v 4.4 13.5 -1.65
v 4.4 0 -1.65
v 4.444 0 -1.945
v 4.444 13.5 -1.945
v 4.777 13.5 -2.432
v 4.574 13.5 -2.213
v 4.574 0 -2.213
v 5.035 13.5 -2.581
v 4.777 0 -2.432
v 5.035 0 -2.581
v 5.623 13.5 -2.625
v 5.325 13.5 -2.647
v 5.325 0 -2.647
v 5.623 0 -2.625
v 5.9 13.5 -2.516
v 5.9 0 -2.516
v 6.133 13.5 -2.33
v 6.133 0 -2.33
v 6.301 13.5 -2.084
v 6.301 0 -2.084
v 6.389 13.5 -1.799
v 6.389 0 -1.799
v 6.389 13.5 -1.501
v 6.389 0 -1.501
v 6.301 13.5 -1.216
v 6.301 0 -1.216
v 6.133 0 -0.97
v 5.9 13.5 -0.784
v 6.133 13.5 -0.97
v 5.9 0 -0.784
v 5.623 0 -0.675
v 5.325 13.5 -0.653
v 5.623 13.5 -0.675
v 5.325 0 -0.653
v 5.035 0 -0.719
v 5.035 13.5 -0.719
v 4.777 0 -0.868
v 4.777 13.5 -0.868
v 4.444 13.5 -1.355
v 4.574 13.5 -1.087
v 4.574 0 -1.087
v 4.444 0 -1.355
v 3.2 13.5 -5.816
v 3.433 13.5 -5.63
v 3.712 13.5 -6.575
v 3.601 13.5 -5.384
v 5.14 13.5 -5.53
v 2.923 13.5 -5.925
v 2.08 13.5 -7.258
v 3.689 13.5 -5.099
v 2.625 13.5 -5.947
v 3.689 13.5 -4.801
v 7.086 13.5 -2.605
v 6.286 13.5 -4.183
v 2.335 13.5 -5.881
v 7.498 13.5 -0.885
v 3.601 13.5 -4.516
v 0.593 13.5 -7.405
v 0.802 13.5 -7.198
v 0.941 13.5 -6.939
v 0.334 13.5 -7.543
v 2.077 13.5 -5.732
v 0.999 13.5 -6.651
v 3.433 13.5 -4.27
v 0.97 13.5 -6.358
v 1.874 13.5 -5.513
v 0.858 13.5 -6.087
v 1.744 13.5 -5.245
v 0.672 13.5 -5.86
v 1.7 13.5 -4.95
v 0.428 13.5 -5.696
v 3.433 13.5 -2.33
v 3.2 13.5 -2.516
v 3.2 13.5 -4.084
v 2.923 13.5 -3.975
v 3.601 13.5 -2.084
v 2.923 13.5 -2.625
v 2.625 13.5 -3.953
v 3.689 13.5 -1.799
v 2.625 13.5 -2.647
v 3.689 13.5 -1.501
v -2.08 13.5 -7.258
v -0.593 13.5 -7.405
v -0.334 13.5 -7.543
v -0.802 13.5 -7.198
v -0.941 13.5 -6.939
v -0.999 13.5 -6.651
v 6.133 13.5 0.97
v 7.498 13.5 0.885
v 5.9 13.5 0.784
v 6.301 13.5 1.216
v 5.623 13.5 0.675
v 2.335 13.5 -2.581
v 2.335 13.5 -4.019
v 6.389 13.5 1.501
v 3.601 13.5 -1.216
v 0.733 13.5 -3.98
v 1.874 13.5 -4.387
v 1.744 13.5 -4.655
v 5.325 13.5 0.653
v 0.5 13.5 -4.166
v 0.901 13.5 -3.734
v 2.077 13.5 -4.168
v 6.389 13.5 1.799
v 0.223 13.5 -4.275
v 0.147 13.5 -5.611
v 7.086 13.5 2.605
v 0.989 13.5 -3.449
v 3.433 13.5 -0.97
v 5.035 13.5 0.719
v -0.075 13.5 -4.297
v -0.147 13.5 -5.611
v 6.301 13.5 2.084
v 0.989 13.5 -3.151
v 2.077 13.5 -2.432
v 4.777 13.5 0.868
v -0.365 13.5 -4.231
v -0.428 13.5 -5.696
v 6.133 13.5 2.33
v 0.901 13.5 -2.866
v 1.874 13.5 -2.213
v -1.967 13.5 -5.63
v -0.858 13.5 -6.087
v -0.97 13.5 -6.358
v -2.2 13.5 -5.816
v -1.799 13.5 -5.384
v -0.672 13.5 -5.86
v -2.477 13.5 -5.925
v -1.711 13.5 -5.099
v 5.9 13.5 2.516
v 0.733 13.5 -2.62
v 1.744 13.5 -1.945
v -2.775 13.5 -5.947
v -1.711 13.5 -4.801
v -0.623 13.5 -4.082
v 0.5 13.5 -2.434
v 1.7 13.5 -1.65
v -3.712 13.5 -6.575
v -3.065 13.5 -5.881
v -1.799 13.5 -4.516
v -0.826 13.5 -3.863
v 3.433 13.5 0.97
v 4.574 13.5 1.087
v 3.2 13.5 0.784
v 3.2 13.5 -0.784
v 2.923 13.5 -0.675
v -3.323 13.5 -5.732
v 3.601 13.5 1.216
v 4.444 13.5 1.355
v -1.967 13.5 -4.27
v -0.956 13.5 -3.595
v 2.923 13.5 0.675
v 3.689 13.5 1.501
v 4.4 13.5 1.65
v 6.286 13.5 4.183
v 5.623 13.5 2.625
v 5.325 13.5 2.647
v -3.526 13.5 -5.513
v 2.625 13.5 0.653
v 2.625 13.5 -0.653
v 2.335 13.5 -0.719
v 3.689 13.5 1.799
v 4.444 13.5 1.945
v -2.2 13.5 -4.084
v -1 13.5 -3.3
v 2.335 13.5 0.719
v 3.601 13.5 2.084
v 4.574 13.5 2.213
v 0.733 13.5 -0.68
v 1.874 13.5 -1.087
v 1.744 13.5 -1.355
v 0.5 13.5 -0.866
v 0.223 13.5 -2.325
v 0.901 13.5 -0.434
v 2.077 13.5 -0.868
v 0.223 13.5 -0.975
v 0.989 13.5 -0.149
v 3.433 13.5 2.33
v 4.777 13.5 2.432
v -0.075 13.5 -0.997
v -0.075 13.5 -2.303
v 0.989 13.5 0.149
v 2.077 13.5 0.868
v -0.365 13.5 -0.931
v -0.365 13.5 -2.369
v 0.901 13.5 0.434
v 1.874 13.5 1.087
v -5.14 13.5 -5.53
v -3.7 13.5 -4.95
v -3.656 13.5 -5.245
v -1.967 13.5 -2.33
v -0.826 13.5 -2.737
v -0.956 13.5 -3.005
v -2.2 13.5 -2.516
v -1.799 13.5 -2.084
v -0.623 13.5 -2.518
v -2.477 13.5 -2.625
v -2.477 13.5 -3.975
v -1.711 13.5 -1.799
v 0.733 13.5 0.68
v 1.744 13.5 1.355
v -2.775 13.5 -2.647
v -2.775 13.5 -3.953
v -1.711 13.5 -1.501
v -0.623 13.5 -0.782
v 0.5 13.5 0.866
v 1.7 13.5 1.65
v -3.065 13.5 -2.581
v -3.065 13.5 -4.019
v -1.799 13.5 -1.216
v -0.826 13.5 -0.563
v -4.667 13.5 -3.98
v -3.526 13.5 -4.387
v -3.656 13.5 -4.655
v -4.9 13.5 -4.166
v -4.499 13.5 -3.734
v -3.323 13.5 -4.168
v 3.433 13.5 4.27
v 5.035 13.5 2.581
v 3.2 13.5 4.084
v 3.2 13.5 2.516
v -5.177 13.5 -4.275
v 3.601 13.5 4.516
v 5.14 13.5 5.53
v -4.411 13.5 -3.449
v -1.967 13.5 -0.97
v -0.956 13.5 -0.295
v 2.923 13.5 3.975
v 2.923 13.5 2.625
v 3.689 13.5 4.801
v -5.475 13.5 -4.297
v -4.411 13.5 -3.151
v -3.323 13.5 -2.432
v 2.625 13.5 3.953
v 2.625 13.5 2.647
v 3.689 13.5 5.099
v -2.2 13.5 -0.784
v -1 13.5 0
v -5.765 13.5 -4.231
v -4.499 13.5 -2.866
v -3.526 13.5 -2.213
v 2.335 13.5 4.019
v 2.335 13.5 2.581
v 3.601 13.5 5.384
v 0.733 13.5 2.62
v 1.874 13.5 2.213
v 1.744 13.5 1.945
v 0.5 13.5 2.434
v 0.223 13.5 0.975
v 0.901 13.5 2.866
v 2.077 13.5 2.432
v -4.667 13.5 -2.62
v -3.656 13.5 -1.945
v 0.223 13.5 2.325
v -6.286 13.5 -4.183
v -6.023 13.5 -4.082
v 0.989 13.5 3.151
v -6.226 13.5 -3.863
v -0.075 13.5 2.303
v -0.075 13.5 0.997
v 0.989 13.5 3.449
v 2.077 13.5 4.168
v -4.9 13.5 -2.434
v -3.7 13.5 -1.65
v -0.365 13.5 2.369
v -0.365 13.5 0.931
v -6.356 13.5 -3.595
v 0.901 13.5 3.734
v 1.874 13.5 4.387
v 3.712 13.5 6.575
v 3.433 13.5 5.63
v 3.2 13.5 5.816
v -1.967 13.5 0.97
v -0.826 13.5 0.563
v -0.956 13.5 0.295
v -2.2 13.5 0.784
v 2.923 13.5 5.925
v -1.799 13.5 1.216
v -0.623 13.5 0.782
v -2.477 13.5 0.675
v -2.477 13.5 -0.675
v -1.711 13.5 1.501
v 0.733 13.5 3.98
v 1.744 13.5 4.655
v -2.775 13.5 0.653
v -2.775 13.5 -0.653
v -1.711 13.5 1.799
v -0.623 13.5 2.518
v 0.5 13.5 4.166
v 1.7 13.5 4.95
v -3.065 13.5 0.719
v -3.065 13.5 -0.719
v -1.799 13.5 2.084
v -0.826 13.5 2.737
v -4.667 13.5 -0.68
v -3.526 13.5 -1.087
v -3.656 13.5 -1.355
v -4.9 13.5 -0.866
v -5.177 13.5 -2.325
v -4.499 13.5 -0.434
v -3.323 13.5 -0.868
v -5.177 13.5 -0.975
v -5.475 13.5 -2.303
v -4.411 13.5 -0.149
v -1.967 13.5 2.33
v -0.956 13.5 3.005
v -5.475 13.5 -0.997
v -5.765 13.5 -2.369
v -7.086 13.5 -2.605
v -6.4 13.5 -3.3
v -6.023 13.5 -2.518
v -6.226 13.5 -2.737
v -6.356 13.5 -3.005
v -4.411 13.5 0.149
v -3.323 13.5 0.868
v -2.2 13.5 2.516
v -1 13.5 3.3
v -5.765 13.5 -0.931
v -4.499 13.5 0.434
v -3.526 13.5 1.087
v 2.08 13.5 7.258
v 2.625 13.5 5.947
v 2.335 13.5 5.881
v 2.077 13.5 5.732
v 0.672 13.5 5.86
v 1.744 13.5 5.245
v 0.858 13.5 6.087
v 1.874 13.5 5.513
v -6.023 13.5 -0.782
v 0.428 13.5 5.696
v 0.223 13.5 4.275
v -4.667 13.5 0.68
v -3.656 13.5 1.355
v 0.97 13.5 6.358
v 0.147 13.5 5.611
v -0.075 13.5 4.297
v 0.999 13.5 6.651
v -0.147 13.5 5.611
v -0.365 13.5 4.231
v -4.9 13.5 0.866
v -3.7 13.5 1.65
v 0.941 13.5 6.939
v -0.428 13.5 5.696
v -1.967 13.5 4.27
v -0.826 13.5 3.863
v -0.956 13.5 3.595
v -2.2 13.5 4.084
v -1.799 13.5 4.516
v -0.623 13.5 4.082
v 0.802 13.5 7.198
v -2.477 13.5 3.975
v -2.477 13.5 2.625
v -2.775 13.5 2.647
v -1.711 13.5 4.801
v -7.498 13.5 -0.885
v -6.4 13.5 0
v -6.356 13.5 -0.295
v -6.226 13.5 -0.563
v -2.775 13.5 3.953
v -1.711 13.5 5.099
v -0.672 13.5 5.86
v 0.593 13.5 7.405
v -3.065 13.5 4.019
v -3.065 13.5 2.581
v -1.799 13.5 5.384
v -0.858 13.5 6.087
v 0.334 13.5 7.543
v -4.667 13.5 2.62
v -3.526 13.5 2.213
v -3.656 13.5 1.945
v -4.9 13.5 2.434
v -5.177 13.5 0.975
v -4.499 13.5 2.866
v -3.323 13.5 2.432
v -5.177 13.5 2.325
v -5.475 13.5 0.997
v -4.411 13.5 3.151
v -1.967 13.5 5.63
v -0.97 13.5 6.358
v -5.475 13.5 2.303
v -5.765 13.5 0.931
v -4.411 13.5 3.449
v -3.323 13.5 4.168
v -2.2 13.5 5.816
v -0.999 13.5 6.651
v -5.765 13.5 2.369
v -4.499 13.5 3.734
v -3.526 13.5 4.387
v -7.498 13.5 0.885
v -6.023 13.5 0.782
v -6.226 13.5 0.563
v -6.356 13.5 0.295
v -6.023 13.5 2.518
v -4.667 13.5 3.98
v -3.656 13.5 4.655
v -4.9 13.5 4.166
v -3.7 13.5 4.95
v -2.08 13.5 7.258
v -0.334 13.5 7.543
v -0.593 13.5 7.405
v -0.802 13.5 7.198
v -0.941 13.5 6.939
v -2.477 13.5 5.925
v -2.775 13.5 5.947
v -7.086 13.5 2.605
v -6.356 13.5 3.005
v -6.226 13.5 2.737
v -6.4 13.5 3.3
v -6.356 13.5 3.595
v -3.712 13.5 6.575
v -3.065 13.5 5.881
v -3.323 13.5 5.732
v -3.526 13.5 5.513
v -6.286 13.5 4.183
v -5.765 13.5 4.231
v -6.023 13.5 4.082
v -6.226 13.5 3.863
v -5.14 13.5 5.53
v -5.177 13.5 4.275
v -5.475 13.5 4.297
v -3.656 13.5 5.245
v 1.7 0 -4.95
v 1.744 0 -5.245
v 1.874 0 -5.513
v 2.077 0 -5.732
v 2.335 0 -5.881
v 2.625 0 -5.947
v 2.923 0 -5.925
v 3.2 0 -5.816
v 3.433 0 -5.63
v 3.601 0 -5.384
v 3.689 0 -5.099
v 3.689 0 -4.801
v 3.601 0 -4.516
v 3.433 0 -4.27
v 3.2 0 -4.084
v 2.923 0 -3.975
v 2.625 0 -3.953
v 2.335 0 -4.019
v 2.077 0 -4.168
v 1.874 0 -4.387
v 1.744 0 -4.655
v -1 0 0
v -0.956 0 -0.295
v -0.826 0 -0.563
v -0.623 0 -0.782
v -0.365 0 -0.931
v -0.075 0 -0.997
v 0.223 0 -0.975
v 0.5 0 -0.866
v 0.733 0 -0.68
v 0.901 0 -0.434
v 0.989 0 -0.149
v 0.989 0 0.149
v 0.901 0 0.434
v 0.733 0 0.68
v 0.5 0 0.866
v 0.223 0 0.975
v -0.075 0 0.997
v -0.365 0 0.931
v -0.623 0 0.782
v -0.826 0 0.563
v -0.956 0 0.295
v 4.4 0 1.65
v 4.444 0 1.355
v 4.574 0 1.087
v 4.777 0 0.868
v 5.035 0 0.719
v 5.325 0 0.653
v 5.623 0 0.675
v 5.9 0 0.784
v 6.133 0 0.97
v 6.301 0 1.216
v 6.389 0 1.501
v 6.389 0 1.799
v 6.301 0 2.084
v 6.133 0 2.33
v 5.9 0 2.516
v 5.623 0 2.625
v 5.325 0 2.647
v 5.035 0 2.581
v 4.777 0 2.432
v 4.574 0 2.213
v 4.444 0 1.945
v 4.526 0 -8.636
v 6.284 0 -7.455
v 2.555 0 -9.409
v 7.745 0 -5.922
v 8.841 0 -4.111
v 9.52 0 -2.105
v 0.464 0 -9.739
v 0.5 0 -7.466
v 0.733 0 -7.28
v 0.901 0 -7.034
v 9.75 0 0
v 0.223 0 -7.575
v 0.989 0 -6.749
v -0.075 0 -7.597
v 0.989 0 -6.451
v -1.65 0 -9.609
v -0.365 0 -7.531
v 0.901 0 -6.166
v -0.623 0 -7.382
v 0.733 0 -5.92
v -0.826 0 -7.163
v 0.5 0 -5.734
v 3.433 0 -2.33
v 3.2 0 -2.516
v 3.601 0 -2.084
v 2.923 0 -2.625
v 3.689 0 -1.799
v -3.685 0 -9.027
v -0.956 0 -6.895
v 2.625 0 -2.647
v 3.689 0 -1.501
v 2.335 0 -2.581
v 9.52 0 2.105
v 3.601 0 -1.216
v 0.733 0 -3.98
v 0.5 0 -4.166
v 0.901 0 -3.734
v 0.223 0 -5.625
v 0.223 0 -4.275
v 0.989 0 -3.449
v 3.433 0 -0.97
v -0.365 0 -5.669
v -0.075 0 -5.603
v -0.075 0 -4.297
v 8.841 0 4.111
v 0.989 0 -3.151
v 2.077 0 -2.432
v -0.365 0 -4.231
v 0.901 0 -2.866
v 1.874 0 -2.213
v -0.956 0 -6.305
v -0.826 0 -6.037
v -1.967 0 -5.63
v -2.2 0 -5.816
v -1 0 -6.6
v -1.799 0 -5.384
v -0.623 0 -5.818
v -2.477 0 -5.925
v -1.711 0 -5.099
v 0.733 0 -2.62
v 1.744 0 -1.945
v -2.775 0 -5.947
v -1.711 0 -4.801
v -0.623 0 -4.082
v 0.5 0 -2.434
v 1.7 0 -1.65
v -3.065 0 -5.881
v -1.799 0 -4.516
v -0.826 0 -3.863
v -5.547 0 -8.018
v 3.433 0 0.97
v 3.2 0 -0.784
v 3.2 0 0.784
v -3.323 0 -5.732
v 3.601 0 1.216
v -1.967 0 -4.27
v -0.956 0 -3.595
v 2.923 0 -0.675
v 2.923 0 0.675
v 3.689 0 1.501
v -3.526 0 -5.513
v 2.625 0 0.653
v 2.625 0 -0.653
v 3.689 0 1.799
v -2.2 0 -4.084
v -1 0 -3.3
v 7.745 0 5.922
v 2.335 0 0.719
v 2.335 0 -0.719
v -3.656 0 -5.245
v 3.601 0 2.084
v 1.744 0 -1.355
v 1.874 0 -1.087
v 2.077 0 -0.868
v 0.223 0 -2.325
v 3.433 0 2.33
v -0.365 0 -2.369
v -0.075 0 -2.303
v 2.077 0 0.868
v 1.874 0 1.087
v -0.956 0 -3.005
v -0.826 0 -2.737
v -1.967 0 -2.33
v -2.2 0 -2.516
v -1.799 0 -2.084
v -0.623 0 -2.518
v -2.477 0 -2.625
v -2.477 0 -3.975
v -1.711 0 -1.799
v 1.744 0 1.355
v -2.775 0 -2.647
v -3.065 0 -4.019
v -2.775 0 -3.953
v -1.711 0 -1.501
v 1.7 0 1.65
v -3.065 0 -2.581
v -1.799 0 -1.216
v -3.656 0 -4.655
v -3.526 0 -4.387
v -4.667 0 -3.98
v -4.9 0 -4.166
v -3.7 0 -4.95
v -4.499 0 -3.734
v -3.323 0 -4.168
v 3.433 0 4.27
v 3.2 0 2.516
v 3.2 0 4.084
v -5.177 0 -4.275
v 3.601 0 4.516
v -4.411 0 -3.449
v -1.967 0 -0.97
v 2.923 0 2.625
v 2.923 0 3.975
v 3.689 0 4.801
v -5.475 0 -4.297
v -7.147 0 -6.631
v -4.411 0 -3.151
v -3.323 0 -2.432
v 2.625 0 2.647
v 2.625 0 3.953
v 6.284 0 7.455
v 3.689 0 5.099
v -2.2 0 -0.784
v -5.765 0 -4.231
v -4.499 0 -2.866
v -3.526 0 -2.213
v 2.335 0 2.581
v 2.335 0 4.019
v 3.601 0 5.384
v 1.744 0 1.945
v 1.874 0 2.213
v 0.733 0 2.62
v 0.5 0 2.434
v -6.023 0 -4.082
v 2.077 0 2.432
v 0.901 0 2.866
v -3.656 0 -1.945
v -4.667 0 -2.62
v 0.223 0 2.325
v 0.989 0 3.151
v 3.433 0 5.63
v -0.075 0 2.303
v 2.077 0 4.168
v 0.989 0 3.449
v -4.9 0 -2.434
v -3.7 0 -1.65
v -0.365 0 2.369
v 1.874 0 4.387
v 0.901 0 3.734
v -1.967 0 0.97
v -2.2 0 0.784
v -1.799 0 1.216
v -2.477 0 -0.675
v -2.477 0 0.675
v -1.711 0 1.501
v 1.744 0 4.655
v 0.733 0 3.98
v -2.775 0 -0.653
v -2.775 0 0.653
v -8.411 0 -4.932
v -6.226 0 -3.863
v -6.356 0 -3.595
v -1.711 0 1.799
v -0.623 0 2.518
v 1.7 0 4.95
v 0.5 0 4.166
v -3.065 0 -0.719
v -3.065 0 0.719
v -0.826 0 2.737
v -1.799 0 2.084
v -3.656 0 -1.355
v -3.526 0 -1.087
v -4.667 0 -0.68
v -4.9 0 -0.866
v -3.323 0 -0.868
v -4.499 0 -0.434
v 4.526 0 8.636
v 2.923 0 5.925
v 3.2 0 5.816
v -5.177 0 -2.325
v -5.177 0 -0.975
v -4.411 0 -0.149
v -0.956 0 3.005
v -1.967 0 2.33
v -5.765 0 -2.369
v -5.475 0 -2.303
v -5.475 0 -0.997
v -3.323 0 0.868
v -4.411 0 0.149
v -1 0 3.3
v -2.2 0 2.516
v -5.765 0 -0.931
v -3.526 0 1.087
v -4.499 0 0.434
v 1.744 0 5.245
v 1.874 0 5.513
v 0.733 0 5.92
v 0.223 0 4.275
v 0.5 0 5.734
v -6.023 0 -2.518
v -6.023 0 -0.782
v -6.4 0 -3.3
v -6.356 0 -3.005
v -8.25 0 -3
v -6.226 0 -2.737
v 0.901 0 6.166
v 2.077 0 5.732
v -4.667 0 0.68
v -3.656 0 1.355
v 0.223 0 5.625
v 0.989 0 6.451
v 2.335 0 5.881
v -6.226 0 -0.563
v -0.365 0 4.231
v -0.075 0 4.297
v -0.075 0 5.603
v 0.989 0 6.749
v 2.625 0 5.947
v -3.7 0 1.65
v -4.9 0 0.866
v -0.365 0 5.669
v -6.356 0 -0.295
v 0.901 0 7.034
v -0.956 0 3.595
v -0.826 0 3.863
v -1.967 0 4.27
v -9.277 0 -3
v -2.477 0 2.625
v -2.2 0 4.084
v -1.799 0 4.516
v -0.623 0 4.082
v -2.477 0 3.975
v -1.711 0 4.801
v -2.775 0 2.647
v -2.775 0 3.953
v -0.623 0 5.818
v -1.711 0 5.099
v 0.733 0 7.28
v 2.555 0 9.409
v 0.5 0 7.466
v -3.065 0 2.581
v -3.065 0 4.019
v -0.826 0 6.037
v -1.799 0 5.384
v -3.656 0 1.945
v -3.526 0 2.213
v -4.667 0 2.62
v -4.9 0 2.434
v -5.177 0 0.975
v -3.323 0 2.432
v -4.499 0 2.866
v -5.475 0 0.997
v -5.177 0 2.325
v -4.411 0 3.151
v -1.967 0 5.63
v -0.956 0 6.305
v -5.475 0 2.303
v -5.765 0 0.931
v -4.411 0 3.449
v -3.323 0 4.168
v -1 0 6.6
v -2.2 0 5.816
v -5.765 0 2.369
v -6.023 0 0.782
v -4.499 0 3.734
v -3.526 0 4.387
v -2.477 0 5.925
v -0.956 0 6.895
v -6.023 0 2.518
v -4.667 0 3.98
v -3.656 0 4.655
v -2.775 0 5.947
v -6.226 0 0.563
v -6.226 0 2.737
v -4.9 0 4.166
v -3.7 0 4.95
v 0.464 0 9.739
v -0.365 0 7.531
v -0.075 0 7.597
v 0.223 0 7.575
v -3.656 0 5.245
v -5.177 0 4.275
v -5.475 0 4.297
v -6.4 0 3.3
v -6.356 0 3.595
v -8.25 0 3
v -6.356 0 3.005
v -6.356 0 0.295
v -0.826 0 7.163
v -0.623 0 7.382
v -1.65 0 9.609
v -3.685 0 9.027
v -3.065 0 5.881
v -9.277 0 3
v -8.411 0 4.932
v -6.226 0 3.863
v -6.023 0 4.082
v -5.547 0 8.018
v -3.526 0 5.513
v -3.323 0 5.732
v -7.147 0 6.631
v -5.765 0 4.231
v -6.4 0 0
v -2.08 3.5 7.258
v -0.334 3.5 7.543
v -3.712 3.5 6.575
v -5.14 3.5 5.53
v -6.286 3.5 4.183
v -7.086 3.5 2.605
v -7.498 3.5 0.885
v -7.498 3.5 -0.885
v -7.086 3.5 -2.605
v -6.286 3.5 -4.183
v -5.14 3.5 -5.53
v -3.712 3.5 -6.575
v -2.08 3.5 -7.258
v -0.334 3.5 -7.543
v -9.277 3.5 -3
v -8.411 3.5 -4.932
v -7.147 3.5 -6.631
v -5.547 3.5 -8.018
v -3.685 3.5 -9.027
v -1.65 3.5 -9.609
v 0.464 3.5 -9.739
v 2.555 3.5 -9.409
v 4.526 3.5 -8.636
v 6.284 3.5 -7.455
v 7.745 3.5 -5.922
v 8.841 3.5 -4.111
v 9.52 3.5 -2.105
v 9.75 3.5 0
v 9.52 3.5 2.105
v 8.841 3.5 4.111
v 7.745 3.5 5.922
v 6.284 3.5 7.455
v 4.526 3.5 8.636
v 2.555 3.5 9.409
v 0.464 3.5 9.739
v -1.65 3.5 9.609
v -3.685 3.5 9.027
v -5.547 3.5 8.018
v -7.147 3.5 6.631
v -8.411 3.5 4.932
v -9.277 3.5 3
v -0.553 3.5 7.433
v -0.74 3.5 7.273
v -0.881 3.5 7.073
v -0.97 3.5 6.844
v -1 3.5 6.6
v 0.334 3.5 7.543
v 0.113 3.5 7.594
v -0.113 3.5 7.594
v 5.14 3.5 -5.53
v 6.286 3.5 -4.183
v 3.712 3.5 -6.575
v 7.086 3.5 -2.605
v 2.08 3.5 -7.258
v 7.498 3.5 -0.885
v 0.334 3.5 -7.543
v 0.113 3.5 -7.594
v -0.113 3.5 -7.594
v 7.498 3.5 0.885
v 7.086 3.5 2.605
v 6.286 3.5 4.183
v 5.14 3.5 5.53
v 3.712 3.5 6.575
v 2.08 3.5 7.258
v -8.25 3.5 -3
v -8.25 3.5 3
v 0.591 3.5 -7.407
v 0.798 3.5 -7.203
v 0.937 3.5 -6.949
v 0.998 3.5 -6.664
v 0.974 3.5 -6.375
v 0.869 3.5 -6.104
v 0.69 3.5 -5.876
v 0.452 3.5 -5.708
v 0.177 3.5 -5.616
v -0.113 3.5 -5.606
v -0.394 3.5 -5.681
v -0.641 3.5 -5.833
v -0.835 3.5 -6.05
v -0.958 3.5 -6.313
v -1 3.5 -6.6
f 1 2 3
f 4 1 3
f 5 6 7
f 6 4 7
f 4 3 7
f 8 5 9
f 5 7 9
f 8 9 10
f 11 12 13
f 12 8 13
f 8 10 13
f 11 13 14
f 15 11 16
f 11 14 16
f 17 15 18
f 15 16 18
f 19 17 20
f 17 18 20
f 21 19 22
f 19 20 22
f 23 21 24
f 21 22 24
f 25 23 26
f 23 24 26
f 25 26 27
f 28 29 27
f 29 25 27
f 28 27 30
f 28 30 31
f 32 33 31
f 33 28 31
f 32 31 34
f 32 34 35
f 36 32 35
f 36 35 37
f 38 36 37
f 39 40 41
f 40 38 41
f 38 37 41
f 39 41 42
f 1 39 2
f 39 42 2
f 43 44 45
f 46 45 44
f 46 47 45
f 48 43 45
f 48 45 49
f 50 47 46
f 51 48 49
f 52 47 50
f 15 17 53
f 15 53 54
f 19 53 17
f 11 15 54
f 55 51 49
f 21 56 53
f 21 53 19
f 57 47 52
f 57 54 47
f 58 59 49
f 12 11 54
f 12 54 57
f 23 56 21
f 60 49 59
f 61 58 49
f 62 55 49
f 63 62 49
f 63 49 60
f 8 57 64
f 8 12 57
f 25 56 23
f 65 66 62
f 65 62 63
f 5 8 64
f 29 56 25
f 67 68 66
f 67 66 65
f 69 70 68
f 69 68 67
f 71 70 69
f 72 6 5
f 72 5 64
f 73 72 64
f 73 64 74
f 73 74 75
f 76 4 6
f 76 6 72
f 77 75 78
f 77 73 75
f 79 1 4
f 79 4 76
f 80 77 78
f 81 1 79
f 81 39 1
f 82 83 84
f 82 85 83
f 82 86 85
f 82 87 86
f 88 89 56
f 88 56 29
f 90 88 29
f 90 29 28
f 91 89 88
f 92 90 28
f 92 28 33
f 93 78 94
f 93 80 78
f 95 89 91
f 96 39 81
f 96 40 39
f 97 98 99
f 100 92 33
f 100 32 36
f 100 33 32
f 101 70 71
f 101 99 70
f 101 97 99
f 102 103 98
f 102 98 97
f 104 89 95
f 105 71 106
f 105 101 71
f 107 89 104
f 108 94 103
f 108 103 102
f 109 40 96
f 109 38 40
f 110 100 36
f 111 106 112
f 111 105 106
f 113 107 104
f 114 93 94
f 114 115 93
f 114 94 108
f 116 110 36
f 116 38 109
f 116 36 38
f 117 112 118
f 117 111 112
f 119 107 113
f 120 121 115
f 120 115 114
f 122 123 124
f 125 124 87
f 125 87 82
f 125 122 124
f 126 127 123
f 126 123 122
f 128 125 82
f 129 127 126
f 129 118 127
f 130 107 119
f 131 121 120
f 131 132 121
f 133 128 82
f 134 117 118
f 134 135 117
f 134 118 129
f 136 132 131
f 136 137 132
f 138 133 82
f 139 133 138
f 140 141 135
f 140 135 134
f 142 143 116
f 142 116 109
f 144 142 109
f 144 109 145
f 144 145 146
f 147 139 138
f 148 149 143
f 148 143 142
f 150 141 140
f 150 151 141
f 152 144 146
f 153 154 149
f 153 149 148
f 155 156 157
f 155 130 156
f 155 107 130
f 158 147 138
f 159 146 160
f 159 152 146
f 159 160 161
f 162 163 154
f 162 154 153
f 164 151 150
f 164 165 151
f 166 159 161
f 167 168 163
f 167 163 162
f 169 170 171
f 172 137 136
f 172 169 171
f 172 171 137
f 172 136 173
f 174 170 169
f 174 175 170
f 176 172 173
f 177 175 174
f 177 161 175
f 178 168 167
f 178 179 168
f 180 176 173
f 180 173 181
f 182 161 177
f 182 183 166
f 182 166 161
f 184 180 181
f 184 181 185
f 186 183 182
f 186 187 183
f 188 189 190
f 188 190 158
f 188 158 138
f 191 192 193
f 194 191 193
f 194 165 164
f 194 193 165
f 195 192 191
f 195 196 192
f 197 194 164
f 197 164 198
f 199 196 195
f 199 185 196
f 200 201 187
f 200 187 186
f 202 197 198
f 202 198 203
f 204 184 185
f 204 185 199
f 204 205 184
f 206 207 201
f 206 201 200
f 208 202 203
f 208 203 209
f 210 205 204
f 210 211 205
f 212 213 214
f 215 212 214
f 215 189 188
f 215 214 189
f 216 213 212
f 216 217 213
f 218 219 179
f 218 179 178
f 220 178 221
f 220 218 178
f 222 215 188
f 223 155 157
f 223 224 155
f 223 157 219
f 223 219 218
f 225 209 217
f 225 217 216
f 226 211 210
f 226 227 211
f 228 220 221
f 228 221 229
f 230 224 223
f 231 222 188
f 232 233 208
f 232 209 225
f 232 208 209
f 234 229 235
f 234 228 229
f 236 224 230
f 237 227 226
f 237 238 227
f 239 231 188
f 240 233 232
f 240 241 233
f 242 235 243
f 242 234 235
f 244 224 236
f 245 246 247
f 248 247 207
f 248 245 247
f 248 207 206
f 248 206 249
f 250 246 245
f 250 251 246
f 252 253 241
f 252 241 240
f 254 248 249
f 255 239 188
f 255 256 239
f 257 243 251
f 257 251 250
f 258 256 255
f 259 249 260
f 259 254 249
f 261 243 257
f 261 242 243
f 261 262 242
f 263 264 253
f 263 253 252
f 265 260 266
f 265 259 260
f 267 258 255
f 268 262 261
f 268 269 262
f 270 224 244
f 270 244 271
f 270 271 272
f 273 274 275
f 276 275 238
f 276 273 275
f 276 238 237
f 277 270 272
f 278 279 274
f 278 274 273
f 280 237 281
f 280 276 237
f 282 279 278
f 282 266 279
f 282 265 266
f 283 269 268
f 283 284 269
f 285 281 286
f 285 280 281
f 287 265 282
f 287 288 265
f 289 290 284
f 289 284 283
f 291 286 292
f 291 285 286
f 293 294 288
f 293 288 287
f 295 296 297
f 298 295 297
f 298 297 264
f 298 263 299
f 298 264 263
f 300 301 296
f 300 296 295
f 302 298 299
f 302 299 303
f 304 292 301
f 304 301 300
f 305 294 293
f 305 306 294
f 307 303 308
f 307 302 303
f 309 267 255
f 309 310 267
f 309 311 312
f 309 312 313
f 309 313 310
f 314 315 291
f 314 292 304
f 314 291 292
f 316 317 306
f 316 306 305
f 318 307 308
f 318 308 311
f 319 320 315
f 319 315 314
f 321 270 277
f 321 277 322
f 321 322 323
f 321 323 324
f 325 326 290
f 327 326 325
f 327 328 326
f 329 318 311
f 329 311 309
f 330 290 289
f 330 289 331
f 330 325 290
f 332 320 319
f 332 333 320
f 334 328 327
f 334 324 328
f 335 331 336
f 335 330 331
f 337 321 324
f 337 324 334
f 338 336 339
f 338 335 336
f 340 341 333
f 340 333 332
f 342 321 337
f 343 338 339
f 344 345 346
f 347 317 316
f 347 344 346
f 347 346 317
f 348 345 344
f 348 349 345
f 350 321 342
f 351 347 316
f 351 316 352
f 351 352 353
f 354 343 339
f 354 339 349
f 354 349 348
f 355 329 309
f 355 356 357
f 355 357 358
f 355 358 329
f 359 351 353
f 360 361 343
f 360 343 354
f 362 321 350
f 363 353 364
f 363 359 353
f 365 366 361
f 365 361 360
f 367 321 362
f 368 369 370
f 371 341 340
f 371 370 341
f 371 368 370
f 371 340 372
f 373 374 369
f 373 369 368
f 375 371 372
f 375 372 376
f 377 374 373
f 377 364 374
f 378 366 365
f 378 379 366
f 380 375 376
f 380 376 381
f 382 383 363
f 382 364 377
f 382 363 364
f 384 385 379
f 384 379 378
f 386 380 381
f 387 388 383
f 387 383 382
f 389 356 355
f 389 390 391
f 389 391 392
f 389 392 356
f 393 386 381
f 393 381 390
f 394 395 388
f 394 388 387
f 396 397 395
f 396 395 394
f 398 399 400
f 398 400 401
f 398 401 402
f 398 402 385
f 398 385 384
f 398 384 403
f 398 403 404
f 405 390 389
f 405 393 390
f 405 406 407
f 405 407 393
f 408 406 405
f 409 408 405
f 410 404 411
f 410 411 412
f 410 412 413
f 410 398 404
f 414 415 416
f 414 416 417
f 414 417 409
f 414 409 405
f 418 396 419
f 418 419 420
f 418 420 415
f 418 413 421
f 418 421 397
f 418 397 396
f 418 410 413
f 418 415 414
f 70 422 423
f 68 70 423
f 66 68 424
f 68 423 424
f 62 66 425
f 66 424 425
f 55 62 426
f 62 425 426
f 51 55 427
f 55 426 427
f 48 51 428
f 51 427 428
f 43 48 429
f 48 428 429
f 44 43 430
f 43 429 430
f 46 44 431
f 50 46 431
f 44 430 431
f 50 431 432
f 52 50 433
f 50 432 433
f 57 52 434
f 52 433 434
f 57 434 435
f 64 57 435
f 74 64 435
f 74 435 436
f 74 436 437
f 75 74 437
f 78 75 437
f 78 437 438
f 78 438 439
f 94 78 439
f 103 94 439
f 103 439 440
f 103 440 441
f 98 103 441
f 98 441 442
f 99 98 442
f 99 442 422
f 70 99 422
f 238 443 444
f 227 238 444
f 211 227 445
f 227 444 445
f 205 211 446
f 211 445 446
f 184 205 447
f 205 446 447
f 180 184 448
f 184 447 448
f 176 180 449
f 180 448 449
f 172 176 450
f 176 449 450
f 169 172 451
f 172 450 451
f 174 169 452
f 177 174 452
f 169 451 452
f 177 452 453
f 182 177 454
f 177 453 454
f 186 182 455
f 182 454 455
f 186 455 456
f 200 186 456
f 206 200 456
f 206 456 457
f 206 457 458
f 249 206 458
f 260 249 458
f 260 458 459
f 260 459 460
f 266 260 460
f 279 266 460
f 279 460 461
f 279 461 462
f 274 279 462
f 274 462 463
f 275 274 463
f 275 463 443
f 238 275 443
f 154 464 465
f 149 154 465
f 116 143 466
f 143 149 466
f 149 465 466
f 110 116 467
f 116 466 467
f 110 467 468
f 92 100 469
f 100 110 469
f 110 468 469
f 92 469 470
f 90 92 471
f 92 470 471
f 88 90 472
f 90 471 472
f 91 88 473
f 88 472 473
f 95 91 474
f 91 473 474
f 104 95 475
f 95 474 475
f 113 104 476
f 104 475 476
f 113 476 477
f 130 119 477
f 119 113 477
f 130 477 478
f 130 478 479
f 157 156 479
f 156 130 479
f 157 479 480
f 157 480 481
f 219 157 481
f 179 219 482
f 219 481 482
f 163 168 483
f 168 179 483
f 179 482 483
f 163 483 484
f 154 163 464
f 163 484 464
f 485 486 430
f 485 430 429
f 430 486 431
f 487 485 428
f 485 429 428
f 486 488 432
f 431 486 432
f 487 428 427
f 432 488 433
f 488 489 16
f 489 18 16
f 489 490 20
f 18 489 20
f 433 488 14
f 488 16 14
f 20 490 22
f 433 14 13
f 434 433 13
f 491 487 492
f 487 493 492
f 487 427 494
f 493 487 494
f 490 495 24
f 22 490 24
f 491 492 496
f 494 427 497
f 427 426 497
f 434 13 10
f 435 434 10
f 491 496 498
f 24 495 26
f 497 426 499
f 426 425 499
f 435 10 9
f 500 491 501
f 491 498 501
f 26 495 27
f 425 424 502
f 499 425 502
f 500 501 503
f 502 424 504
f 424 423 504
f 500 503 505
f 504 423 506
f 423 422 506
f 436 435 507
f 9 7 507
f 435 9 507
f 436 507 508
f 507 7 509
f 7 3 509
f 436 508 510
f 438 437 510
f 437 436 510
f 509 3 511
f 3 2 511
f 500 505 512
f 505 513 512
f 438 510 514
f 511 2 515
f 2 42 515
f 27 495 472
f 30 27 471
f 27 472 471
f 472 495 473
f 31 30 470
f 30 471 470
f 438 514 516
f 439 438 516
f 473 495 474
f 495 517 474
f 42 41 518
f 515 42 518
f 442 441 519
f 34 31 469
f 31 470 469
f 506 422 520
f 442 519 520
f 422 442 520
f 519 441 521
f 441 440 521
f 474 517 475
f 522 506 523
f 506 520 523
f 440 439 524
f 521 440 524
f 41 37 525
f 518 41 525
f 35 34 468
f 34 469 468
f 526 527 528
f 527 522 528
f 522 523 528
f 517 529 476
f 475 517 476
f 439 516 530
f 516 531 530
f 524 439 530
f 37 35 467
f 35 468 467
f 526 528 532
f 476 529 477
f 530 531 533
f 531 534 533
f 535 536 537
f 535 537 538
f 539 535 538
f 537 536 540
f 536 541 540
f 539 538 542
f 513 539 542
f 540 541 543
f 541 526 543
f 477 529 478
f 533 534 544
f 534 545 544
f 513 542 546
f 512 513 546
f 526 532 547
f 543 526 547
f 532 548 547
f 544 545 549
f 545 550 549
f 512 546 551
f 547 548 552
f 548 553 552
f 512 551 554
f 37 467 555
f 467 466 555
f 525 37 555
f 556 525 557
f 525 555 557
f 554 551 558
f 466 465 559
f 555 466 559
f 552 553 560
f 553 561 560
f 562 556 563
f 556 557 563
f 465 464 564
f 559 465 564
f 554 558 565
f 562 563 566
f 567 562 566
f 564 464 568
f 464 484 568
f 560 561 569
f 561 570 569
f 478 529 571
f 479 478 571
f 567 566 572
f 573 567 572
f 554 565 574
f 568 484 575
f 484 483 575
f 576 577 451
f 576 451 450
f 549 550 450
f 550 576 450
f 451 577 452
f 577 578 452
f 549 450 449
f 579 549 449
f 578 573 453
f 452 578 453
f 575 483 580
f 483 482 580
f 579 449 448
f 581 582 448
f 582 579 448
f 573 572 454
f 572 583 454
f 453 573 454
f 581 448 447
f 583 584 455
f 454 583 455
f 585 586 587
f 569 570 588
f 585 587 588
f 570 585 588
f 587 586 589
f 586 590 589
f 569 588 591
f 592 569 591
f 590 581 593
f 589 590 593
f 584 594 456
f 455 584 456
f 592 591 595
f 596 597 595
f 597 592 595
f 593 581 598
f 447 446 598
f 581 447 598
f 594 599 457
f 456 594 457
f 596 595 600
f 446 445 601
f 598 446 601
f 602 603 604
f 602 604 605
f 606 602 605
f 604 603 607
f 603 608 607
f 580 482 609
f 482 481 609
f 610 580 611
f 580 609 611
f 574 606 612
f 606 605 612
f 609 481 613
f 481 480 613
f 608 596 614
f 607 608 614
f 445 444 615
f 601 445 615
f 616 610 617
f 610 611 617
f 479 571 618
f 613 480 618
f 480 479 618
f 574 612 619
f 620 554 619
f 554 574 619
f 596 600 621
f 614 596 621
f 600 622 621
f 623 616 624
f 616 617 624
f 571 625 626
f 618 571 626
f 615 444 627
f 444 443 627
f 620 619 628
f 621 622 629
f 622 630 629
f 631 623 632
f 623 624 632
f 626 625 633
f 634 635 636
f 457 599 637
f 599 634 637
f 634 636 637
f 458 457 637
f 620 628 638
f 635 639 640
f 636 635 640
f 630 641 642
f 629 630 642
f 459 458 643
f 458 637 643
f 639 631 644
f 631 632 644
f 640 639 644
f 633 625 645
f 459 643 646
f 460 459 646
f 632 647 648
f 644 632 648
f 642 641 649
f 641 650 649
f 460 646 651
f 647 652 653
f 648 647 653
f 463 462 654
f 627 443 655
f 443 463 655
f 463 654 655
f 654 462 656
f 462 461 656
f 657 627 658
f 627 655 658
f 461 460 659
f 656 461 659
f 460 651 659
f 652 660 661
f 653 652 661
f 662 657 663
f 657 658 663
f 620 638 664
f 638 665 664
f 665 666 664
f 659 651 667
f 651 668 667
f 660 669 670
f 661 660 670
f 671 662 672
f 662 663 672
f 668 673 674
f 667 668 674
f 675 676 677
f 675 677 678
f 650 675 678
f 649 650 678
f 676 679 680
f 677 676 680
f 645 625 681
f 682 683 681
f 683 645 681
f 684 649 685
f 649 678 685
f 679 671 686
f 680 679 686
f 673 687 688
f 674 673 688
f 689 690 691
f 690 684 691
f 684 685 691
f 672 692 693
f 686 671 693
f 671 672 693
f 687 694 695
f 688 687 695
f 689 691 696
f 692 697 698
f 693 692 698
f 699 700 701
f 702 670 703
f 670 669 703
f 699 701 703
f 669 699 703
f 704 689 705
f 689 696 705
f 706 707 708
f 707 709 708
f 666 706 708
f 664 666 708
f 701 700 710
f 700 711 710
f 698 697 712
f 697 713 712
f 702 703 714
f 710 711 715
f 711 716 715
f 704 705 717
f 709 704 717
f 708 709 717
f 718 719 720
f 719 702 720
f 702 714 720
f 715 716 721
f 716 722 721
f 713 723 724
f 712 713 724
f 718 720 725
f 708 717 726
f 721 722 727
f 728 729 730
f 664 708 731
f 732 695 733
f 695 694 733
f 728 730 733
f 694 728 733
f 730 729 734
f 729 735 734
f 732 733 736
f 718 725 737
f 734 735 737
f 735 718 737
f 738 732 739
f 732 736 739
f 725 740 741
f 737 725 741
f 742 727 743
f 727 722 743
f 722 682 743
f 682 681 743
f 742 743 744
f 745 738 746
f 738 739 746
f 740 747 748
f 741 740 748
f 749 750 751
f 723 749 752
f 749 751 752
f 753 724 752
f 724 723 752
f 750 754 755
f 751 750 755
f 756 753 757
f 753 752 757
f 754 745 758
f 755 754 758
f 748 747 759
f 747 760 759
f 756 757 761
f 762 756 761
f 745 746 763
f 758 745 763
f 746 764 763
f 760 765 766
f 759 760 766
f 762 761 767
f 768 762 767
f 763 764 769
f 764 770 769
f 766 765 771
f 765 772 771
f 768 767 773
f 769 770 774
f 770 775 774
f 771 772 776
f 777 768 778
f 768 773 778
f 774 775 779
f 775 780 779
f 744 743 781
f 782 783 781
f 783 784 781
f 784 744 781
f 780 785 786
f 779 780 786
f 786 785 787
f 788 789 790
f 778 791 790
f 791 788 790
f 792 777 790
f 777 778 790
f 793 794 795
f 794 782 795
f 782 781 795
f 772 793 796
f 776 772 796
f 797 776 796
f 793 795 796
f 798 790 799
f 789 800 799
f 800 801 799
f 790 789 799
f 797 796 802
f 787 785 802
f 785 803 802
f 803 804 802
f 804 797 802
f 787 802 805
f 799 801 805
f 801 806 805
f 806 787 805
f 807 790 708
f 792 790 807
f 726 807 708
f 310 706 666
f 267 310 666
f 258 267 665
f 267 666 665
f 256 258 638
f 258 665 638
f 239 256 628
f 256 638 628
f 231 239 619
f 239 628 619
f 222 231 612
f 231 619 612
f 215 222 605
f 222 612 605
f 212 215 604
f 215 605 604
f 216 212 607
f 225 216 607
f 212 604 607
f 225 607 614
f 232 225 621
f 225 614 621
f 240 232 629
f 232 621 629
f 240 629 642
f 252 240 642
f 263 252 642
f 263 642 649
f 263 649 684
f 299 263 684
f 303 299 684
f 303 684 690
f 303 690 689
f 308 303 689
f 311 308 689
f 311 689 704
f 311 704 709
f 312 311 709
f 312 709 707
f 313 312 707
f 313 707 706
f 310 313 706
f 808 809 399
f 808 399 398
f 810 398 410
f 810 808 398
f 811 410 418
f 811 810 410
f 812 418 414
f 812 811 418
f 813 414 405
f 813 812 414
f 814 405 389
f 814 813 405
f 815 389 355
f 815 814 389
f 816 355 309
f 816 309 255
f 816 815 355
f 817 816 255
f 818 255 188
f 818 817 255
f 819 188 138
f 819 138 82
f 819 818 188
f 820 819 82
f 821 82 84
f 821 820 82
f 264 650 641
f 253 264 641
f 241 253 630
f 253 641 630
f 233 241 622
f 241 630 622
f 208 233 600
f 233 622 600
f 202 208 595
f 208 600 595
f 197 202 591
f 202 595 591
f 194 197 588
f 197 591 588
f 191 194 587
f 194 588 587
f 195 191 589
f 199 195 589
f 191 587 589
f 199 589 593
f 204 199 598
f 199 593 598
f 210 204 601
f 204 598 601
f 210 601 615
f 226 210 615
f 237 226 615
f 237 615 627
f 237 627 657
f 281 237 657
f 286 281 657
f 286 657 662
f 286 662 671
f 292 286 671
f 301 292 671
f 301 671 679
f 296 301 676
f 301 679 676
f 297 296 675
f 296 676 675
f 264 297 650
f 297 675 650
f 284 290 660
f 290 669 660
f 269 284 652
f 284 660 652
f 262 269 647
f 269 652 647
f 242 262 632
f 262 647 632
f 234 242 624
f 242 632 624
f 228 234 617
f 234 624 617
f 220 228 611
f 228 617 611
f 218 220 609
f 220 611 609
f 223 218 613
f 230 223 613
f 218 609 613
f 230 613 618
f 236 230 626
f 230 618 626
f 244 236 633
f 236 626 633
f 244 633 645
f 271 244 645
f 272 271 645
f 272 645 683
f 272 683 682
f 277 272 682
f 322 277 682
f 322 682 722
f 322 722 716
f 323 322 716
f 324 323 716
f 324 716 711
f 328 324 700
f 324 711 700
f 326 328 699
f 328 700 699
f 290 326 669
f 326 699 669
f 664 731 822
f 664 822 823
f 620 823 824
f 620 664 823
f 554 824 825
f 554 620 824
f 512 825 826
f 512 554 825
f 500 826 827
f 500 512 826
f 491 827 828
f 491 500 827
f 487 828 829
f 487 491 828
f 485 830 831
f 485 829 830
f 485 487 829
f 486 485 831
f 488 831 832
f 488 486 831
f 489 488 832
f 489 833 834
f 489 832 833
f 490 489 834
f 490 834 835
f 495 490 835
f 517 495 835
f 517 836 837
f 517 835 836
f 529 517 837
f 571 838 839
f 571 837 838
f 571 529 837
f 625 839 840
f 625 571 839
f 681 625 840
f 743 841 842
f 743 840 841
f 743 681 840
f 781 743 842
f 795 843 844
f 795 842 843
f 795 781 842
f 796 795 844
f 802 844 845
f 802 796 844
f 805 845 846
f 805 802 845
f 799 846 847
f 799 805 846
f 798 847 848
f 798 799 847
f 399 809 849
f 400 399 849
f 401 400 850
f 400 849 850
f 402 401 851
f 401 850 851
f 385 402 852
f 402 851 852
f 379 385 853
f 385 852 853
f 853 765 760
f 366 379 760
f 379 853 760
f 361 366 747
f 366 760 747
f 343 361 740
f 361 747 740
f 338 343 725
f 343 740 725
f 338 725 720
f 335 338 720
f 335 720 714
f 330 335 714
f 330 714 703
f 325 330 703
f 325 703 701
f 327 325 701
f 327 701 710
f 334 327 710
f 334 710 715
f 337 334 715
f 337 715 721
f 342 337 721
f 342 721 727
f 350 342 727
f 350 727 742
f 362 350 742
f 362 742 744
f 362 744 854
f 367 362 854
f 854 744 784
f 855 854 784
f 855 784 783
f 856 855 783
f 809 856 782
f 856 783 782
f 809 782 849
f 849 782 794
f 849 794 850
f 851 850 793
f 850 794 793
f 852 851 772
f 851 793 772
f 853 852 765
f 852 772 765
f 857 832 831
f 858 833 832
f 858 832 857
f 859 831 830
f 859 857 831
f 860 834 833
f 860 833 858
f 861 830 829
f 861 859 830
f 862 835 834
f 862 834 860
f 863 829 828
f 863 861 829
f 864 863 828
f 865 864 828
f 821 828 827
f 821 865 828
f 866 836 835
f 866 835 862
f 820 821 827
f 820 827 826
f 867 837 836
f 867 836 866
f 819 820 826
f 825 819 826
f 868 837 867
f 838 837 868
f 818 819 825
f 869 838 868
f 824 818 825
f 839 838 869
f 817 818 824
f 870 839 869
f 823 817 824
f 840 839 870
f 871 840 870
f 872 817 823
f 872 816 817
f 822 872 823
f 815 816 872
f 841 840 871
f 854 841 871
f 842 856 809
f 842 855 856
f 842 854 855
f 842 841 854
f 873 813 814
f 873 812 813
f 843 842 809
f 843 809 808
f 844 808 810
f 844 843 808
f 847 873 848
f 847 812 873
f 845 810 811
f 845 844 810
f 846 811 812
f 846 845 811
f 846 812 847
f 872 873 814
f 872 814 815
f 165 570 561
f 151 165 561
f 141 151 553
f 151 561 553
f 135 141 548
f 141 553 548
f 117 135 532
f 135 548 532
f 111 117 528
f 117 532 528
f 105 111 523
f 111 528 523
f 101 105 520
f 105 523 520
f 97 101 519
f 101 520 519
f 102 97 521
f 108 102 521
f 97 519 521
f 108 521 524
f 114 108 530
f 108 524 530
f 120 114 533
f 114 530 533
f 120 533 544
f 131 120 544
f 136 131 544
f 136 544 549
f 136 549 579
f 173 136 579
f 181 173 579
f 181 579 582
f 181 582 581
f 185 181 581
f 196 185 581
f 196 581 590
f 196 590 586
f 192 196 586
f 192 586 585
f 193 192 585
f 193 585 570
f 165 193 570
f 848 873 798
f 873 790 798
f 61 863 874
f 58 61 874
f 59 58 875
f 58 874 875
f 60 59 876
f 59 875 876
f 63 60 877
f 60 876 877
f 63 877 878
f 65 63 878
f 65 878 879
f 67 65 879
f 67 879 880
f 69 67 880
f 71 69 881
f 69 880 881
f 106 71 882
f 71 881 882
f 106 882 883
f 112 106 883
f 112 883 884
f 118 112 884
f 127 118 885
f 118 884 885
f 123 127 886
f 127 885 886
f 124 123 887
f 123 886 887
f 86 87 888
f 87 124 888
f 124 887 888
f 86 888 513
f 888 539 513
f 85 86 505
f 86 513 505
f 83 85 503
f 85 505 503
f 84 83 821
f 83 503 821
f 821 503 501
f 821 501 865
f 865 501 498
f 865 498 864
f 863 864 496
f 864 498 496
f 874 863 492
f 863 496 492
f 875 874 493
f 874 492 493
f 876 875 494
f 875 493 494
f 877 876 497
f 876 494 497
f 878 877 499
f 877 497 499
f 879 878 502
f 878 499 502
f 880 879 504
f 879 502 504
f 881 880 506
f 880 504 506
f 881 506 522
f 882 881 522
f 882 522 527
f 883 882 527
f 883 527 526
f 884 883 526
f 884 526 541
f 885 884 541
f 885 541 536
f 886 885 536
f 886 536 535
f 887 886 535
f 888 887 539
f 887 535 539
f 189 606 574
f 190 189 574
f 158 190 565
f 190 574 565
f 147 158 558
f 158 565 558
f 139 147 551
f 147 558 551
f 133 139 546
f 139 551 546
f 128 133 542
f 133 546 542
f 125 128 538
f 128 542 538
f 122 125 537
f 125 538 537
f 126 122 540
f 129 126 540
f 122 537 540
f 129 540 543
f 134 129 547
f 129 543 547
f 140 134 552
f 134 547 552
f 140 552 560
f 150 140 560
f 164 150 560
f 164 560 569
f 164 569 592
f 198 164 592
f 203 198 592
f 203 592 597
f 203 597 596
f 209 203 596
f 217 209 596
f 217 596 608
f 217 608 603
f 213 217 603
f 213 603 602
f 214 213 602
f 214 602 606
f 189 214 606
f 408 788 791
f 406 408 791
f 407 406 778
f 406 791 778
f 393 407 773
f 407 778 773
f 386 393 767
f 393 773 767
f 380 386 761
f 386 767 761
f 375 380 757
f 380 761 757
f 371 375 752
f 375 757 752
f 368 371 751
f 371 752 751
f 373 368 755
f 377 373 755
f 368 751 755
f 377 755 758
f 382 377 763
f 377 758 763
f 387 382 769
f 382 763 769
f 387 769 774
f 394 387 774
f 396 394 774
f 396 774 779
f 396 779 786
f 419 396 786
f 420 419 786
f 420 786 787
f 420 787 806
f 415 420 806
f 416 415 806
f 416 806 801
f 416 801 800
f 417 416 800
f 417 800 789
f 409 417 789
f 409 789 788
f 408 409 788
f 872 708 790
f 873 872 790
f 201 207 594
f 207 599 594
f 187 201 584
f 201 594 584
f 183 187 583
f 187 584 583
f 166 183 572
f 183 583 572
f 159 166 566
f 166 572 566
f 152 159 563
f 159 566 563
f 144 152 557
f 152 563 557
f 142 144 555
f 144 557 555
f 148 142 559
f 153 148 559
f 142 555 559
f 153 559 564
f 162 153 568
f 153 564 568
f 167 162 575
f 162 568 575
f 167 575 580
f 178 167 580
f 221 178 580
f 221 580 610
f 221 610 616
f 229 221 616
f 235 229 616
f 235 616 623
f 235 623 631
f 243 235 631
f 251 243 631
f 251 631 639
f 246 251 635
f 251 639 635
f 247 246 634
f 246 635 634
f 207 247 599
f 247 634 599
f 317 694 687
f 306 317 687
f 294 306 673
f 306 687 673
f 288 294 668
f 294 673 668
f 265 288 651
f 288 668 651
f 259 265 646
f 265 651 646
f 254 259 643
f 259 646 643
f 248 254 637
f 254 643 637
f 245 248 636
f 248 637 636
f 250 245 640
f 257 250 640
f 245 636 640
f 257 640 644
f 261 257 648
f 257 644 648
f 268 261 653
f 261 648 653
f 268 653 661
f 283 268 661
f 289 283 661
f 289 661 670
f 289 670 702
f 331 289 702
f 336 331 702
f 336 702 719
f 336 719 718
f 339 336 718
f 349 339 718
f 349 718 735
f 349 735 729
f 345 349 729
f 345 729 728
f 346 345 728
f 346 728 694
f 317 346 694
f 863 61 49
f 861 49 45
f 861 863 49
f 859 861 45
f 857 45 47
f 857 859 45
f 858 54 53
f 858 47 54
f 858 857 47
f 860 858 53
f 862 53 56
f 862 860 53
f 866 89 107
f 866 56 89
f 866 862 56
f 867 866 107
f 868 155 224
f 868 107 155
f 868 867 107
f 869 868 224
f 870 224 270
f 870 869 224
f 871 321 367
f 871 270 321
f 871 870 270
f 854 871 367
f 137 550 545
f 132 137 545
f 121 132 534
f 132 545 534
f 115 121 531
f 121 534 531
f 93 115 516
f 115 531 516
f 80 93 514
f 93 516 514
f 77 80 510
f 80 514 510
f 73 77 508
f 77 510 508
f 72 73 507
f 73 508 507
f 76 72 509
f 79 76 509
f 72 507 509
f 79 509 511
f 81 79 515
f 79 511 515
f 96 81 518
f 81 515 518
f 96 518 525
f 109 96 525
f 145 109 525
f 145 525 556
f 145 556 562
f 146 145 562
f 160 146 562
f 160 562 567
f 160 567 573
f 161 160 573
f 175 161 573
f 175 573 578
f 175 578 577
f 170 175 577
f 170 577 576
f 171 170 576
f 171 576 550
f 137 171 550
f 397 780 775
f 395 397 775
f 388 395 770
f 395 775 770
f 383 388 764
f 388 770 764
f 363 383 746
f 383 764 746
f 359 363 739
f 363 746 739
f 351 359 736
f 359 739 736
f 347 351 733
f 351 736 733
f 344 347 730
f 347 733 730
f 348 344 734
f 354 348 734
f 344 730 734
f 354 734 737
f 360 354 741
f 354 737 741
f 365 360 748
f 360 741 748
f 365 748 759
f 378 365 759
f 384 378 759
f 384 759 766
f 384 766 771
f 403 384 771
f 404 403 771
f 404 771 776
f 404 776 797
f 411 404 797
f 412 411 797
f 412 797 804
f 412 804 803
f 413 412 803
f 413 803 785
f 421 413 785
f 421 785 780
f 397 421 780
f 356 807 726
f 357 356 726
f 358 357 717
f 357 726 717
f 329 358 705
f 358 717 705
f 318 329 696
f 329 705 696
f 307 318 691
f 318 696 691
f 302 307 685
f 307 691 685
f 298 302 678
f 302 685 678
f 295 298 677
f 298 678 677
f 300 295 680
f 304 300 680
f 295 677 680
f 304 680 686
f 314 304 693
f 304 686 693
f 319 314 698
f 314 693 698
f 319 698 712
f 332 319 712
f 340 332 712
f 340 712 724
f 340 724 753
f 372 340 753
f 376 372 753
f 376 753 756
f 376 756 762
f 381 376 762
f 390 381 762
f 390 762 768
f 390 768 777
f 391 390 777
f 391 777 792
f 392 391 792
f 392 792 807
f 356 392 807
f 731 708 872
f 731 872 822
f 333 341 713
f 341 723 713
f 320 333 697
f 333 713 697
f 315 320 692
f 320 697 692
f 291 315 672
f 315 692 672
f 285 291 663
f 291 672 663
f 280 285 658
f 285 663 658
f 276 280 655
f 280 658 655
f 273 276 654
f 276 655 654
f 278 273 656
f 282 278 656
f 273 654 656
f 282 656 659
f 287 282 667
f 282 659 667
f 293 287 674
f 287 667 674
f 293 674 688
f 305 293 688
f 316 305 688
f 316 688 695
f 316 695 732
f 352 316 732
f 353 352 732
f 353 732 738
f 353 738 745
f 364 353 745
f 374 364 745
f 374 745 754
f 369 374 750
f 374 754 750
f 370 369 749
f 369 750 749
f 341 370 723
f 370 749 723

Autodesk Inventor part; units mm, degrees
ref_plane "YZ Plane" through (0, 0, 0) normal (1, 0, 0) x (0, 1, 0)
ref_plane "XZ Plane" through (0, 0, 0) normal (0, 1, 0) x (-1, 0, 0)
ref_plane "XY Plane" through (0, 0, 0) normal (0, 0, 1) x (1, 0, 0)
sketch "Sketch1" plane through (0, 0, 0) normal (0, 1, 0) x (-1, 0, 0)
  point P0 (0, 0)
sketch "Sketch2" plane through (0, 0, 0) normal (0, 1, 0) x (-1, 0, 0)
  line L0 (0, -0.6) -> (0, -2.7)
  line L1 (0, -2.7) -> (0, -3.3)
  line L2 (0, -3.9) -> (0, -6)
  line L3 (0, -6) -> (0, -6.6)
  line L4 (0, 0.6) -> (0, 3.3)
  line L5 (0, 3.9) -> (0, 6.6)
  line L6 (0, -0.6) -> (0, -1.65)
  line L7 (0, -0.6) -> (0, -1.65)
  line L8 (0, -1.65) -> (2.7, -1.65)
  line L9 (2.7, -1.65) -> (2.7, -3.75)
  line L10 (2.7, -3.75) -> (2.7, -4.95)
  line L11 (2.7, -1.05) -> (2.7, 1.05)
  line L12 (2.7, 1.05) -> (2.7, 1.65)
  line L13 (2.7, 2.25) -> (2.7, 4.95)
  line L14 (2.7, 0) -> (5.4, 0)
  line L15 (5.4, 0) -> (5.4, -3.3)
  line L16 (5.4, 0) -> (5.4, 3.3)
  line L17 (0, -1.65) -> (-2.7, -1.65)
  line L18 (-2.7, -1.65) -> (-2.7, -4.35)
  line L19 (-2.7, -4.35) -> (-2.7, -4.95)
  line L20 (-2.7, -1.65) -> (-2.7, 1.65)
  line L21 (-2.7, 1.65) -> (-2.7, 4.95)
  line L22 (-2.7, -1.65) -> (-5.4, -1.65)
  line L23 (-2.7, 1.65) -> (-5.4, 1.65)
  circle A0 centre (0, -6.6) radius 1
  circle A1 centre (2.7, -4.95) radius 1
  circle A2 centre (-2.7, -4.95) radius 1
  circle A3 centre (0, -3.3) radius 1
  circle A4 centre (5.4, -3.3) radius 1
  circle A5 centre (2.7, -1.65) radius 1
  circle A6 centre (-2.7, -1.65) radius 1
  circle A7 centre (-5.4, -1.65) radius 1
  circle A8 centre (0, 0) radius 1
  circle A9 centre (5.4, 0) radius 1
  circle A10 centre (2.7, 1.65) radius 1
  circle A11 centre (5.4, 3.3) radius 1
  circle A12 centre (0, 3.3) radius 1
  circle A13 centre (-2.7, 1.65) radius 1
  circle A14 centre (-5.4, 1.65) radius 1
  circle A15 centre (-2.7, 4.95) radius 1
  circle A16 centre (2.7, 4.95) radius 1
  circle A17 centre (0, 6.6) radius 1
  circle A18 centre (0, 0) radius 9.75
  line L24 (9.75, 0) -> (8.25, 0)
  line L25 (8.25, 0) -> (8.25, 3)
  line L26 (8.25, 3) -> (10.1008, 3)
  line L27 (8.25, 0) -> (8.25, -3)
  line L28 (8.25, -3) -> (10.4334, -3)
  point P0 (-2, 10.0571)
  point P1 (2, 10.0571)
  point P2 (9.277, 3)
  point P3 (9.277, -3)
  dimension "d127" = 19.5
  dimension "d53" = 2.1
  dimension "d54" = 0.6
  dimension "d56" = 2.1
  dimension "d57" = 0.6
  dimension "d59" = 2.7
  dimension "d61" = 2.7
  dimension "d63" = 1.05
  dimension "d64" = 2.7
  dimension "d66" = 2.1
  dimension "d67" = 1.2
  dimension "d69" = 2.1
  dimension "d70" = 0.6
  dimension "d72" = 2.7
  dimension "d74" = 2.7
  dimension "d78" = 2.7
  dimension "d80" = 2.7
  dimension "d81" = 0.6
  dimension "d85" = 2.7
  dimension "d87" = 2.7
  dimension "d91" = 2
  dimension "d92" = 2
  dimension "d93" = 2
  dimension "d94" = 2
  dimension "d95" = 2
  dimension "d96" = 2
  dimension "d97" = 2
  dimension "d98" = 2
  dimension "d99" = 2
  dimension "d100" = 2
  dimension "d101" = 2
  dimension "d102" = 2
  dimension "d103" = 2
  dimension "d104" = 2
  dimension "d105" = 2
  dimension "d106" = 2
  dimension "d107" = 2
  dimension "d108" = 2
  dimension "d128" = 1.5
  dimension "d129" = 3
  dimension "d130" = 3
extrude "Extrusion1" add sketch "Sketch2" along normal blind 3.5 contours L26 L25 L27 L28 A18
sketch "Sketch3" plane through (0, 3.5, 0) normal (0, 1, 0) x (-1, 0, 0)
  circle A0 centre (0, 0) radius 7.55
  line L0 (0, -0.6) -> (0, -2.7)
  line L1 (0, -2.7) -> (0, -3.3)
  line L2 (0, -3.9) -> (0, -6)
  line L3 (0, -6) -> (0, -6.6)
  line L4 (0, 0.6) -> (0, 3.3)
  line L5 (0, 3.9) -> (0, 6.6)
  line L6 (0, -0.6) -> (0, -1.65)
  line L7 (0, -0.6) -> (0, -1.65)
  line L8 (0, -1.65) -> (2.7, -1.65)
  line L9 (2.7, -1.65) -> (2.7, -3.75)
  line L10 (2.7, -3.75) -> (2.7, -4.95)
  line L11 (2.7, -1.05) -> (2.7, 1.05)
  line L12 (2.7, 1.05) -> (2.7, 1.65)
  line L13 (2.7, 2.25) -> (2.7, 4.95)
  line L14 (2.7, 0) -> (5.4, 0)
  line L15 (5.4, 0) -> (5.4, -3.3)
  line L16 (5.4, 0) -> (5.4, 3.3)
  line L17 (0, -1.65) -> (-2.7, -1.65)
  line L18 (-2.7, -1.65) -> (-2.7, -4.35)
  line L19 (-2.7, -4.35) -> (-2.7, -4.95)
  line L20 (-2.7, -1.65) -> (-2.7, 1.65)
  line L21 (-2.7, 1.65) -> (-2.7, 4.95)
  line L22 (-2.7, -1.65) -> (-5.4, -1.65)
  line L23 (-2.7, 1.65) -> (-5.4, 1.65)
  circle A1 centre (0, -6.6) radius 1
  circle A2 centre (-2.7, -4.95) radius 1
  circle A3 centre (0, -3.3) radius 1
  circle A4 centre (2.7, -4.95) radius 1
  circle A5 centre (5.4, -3.3) radius 1
  circle A6 centre (2.7, -1.65) radius 1
  circle A7 centre (-2.7, -1.65) radius 1
  circle A8 centre (-5.4, -1.65) radius 1
  circle A9 centre (5.4, 0) radius 1
  circle A10 centre (0, 0) radius 1
  circle A11 centre (2.7, 1.65) radius 1
  circle A12 centre (-2.7, 1.65) radius 1
  circle A13 centre (-5.4, 1.65) radius 1
  circle A14 centre (0, 3.3) radius 1
  circle A15 centre (5.4, 3.3) radius 1
  circle A16 centre (2.7, 4.95) radius 1
  circle A17 centre (-2.7, 4.95) radius 1
  circle A18 centre (0, 6.6) radius 1
  point P0 (-0.3339, 7.5426)
  point P1 (-0.3339, -7.5426)
  point P2 (0.3339, -7.5426)
  point P3 (0.3339, 7.5426)
  dimension "d12" = 2.1
  dimension "d13" = 0.6
  dimension "d15" = 2.1
  dimension "d16" = 0.6
  dimension "d18" = 2.7
  dimension "d20" = 2.7
  dimension "d22" = 1.05
  dimension "d23" = 2.7
  dimension "d25" = 2.1
  dimension "d26" = 1.2
  dimension "d28" = 2.1
  dimension "d29" = 0.6
  dimension "d31" = 2.7
  dimension "d33" = 2.7
  dimension "d37" = 2.7
  dimension "d39" = 2.7
  dimension "d40" = 0.6
  dimension "d44" = 2.7
  dimension "d46" = 2.7
  dimension "d109" = 2
  dimension "d110" = 2
  dimension "d111" = 2
  dimension "d112" = 2
  dimension "d113" = 2
  dimension "d114" = 2
  dimension "d115" = 2
  dimension "d116" = 2
  dimension "d117" = 2
  dimension "d118" = 2
  dimension "d119" = 2
  dimension "d120" = 2
  dimension "d121" = 2
  dimension "d122" = 2
  dimension "d123" = 2
  dimension "d124" = 2
  dimension "d125" = 2
  dimension "d126" = 2
extrude "Extrusion2" add sketch "Sketch3" along normal blind 10 contours A0 A1 L2 A3 L0 A10 L4 A14 L5 A18 | A18 L5 A14 L4 A10 L0 A3 L2 A1 A0
properties part number "inner Part of Adaptor"
